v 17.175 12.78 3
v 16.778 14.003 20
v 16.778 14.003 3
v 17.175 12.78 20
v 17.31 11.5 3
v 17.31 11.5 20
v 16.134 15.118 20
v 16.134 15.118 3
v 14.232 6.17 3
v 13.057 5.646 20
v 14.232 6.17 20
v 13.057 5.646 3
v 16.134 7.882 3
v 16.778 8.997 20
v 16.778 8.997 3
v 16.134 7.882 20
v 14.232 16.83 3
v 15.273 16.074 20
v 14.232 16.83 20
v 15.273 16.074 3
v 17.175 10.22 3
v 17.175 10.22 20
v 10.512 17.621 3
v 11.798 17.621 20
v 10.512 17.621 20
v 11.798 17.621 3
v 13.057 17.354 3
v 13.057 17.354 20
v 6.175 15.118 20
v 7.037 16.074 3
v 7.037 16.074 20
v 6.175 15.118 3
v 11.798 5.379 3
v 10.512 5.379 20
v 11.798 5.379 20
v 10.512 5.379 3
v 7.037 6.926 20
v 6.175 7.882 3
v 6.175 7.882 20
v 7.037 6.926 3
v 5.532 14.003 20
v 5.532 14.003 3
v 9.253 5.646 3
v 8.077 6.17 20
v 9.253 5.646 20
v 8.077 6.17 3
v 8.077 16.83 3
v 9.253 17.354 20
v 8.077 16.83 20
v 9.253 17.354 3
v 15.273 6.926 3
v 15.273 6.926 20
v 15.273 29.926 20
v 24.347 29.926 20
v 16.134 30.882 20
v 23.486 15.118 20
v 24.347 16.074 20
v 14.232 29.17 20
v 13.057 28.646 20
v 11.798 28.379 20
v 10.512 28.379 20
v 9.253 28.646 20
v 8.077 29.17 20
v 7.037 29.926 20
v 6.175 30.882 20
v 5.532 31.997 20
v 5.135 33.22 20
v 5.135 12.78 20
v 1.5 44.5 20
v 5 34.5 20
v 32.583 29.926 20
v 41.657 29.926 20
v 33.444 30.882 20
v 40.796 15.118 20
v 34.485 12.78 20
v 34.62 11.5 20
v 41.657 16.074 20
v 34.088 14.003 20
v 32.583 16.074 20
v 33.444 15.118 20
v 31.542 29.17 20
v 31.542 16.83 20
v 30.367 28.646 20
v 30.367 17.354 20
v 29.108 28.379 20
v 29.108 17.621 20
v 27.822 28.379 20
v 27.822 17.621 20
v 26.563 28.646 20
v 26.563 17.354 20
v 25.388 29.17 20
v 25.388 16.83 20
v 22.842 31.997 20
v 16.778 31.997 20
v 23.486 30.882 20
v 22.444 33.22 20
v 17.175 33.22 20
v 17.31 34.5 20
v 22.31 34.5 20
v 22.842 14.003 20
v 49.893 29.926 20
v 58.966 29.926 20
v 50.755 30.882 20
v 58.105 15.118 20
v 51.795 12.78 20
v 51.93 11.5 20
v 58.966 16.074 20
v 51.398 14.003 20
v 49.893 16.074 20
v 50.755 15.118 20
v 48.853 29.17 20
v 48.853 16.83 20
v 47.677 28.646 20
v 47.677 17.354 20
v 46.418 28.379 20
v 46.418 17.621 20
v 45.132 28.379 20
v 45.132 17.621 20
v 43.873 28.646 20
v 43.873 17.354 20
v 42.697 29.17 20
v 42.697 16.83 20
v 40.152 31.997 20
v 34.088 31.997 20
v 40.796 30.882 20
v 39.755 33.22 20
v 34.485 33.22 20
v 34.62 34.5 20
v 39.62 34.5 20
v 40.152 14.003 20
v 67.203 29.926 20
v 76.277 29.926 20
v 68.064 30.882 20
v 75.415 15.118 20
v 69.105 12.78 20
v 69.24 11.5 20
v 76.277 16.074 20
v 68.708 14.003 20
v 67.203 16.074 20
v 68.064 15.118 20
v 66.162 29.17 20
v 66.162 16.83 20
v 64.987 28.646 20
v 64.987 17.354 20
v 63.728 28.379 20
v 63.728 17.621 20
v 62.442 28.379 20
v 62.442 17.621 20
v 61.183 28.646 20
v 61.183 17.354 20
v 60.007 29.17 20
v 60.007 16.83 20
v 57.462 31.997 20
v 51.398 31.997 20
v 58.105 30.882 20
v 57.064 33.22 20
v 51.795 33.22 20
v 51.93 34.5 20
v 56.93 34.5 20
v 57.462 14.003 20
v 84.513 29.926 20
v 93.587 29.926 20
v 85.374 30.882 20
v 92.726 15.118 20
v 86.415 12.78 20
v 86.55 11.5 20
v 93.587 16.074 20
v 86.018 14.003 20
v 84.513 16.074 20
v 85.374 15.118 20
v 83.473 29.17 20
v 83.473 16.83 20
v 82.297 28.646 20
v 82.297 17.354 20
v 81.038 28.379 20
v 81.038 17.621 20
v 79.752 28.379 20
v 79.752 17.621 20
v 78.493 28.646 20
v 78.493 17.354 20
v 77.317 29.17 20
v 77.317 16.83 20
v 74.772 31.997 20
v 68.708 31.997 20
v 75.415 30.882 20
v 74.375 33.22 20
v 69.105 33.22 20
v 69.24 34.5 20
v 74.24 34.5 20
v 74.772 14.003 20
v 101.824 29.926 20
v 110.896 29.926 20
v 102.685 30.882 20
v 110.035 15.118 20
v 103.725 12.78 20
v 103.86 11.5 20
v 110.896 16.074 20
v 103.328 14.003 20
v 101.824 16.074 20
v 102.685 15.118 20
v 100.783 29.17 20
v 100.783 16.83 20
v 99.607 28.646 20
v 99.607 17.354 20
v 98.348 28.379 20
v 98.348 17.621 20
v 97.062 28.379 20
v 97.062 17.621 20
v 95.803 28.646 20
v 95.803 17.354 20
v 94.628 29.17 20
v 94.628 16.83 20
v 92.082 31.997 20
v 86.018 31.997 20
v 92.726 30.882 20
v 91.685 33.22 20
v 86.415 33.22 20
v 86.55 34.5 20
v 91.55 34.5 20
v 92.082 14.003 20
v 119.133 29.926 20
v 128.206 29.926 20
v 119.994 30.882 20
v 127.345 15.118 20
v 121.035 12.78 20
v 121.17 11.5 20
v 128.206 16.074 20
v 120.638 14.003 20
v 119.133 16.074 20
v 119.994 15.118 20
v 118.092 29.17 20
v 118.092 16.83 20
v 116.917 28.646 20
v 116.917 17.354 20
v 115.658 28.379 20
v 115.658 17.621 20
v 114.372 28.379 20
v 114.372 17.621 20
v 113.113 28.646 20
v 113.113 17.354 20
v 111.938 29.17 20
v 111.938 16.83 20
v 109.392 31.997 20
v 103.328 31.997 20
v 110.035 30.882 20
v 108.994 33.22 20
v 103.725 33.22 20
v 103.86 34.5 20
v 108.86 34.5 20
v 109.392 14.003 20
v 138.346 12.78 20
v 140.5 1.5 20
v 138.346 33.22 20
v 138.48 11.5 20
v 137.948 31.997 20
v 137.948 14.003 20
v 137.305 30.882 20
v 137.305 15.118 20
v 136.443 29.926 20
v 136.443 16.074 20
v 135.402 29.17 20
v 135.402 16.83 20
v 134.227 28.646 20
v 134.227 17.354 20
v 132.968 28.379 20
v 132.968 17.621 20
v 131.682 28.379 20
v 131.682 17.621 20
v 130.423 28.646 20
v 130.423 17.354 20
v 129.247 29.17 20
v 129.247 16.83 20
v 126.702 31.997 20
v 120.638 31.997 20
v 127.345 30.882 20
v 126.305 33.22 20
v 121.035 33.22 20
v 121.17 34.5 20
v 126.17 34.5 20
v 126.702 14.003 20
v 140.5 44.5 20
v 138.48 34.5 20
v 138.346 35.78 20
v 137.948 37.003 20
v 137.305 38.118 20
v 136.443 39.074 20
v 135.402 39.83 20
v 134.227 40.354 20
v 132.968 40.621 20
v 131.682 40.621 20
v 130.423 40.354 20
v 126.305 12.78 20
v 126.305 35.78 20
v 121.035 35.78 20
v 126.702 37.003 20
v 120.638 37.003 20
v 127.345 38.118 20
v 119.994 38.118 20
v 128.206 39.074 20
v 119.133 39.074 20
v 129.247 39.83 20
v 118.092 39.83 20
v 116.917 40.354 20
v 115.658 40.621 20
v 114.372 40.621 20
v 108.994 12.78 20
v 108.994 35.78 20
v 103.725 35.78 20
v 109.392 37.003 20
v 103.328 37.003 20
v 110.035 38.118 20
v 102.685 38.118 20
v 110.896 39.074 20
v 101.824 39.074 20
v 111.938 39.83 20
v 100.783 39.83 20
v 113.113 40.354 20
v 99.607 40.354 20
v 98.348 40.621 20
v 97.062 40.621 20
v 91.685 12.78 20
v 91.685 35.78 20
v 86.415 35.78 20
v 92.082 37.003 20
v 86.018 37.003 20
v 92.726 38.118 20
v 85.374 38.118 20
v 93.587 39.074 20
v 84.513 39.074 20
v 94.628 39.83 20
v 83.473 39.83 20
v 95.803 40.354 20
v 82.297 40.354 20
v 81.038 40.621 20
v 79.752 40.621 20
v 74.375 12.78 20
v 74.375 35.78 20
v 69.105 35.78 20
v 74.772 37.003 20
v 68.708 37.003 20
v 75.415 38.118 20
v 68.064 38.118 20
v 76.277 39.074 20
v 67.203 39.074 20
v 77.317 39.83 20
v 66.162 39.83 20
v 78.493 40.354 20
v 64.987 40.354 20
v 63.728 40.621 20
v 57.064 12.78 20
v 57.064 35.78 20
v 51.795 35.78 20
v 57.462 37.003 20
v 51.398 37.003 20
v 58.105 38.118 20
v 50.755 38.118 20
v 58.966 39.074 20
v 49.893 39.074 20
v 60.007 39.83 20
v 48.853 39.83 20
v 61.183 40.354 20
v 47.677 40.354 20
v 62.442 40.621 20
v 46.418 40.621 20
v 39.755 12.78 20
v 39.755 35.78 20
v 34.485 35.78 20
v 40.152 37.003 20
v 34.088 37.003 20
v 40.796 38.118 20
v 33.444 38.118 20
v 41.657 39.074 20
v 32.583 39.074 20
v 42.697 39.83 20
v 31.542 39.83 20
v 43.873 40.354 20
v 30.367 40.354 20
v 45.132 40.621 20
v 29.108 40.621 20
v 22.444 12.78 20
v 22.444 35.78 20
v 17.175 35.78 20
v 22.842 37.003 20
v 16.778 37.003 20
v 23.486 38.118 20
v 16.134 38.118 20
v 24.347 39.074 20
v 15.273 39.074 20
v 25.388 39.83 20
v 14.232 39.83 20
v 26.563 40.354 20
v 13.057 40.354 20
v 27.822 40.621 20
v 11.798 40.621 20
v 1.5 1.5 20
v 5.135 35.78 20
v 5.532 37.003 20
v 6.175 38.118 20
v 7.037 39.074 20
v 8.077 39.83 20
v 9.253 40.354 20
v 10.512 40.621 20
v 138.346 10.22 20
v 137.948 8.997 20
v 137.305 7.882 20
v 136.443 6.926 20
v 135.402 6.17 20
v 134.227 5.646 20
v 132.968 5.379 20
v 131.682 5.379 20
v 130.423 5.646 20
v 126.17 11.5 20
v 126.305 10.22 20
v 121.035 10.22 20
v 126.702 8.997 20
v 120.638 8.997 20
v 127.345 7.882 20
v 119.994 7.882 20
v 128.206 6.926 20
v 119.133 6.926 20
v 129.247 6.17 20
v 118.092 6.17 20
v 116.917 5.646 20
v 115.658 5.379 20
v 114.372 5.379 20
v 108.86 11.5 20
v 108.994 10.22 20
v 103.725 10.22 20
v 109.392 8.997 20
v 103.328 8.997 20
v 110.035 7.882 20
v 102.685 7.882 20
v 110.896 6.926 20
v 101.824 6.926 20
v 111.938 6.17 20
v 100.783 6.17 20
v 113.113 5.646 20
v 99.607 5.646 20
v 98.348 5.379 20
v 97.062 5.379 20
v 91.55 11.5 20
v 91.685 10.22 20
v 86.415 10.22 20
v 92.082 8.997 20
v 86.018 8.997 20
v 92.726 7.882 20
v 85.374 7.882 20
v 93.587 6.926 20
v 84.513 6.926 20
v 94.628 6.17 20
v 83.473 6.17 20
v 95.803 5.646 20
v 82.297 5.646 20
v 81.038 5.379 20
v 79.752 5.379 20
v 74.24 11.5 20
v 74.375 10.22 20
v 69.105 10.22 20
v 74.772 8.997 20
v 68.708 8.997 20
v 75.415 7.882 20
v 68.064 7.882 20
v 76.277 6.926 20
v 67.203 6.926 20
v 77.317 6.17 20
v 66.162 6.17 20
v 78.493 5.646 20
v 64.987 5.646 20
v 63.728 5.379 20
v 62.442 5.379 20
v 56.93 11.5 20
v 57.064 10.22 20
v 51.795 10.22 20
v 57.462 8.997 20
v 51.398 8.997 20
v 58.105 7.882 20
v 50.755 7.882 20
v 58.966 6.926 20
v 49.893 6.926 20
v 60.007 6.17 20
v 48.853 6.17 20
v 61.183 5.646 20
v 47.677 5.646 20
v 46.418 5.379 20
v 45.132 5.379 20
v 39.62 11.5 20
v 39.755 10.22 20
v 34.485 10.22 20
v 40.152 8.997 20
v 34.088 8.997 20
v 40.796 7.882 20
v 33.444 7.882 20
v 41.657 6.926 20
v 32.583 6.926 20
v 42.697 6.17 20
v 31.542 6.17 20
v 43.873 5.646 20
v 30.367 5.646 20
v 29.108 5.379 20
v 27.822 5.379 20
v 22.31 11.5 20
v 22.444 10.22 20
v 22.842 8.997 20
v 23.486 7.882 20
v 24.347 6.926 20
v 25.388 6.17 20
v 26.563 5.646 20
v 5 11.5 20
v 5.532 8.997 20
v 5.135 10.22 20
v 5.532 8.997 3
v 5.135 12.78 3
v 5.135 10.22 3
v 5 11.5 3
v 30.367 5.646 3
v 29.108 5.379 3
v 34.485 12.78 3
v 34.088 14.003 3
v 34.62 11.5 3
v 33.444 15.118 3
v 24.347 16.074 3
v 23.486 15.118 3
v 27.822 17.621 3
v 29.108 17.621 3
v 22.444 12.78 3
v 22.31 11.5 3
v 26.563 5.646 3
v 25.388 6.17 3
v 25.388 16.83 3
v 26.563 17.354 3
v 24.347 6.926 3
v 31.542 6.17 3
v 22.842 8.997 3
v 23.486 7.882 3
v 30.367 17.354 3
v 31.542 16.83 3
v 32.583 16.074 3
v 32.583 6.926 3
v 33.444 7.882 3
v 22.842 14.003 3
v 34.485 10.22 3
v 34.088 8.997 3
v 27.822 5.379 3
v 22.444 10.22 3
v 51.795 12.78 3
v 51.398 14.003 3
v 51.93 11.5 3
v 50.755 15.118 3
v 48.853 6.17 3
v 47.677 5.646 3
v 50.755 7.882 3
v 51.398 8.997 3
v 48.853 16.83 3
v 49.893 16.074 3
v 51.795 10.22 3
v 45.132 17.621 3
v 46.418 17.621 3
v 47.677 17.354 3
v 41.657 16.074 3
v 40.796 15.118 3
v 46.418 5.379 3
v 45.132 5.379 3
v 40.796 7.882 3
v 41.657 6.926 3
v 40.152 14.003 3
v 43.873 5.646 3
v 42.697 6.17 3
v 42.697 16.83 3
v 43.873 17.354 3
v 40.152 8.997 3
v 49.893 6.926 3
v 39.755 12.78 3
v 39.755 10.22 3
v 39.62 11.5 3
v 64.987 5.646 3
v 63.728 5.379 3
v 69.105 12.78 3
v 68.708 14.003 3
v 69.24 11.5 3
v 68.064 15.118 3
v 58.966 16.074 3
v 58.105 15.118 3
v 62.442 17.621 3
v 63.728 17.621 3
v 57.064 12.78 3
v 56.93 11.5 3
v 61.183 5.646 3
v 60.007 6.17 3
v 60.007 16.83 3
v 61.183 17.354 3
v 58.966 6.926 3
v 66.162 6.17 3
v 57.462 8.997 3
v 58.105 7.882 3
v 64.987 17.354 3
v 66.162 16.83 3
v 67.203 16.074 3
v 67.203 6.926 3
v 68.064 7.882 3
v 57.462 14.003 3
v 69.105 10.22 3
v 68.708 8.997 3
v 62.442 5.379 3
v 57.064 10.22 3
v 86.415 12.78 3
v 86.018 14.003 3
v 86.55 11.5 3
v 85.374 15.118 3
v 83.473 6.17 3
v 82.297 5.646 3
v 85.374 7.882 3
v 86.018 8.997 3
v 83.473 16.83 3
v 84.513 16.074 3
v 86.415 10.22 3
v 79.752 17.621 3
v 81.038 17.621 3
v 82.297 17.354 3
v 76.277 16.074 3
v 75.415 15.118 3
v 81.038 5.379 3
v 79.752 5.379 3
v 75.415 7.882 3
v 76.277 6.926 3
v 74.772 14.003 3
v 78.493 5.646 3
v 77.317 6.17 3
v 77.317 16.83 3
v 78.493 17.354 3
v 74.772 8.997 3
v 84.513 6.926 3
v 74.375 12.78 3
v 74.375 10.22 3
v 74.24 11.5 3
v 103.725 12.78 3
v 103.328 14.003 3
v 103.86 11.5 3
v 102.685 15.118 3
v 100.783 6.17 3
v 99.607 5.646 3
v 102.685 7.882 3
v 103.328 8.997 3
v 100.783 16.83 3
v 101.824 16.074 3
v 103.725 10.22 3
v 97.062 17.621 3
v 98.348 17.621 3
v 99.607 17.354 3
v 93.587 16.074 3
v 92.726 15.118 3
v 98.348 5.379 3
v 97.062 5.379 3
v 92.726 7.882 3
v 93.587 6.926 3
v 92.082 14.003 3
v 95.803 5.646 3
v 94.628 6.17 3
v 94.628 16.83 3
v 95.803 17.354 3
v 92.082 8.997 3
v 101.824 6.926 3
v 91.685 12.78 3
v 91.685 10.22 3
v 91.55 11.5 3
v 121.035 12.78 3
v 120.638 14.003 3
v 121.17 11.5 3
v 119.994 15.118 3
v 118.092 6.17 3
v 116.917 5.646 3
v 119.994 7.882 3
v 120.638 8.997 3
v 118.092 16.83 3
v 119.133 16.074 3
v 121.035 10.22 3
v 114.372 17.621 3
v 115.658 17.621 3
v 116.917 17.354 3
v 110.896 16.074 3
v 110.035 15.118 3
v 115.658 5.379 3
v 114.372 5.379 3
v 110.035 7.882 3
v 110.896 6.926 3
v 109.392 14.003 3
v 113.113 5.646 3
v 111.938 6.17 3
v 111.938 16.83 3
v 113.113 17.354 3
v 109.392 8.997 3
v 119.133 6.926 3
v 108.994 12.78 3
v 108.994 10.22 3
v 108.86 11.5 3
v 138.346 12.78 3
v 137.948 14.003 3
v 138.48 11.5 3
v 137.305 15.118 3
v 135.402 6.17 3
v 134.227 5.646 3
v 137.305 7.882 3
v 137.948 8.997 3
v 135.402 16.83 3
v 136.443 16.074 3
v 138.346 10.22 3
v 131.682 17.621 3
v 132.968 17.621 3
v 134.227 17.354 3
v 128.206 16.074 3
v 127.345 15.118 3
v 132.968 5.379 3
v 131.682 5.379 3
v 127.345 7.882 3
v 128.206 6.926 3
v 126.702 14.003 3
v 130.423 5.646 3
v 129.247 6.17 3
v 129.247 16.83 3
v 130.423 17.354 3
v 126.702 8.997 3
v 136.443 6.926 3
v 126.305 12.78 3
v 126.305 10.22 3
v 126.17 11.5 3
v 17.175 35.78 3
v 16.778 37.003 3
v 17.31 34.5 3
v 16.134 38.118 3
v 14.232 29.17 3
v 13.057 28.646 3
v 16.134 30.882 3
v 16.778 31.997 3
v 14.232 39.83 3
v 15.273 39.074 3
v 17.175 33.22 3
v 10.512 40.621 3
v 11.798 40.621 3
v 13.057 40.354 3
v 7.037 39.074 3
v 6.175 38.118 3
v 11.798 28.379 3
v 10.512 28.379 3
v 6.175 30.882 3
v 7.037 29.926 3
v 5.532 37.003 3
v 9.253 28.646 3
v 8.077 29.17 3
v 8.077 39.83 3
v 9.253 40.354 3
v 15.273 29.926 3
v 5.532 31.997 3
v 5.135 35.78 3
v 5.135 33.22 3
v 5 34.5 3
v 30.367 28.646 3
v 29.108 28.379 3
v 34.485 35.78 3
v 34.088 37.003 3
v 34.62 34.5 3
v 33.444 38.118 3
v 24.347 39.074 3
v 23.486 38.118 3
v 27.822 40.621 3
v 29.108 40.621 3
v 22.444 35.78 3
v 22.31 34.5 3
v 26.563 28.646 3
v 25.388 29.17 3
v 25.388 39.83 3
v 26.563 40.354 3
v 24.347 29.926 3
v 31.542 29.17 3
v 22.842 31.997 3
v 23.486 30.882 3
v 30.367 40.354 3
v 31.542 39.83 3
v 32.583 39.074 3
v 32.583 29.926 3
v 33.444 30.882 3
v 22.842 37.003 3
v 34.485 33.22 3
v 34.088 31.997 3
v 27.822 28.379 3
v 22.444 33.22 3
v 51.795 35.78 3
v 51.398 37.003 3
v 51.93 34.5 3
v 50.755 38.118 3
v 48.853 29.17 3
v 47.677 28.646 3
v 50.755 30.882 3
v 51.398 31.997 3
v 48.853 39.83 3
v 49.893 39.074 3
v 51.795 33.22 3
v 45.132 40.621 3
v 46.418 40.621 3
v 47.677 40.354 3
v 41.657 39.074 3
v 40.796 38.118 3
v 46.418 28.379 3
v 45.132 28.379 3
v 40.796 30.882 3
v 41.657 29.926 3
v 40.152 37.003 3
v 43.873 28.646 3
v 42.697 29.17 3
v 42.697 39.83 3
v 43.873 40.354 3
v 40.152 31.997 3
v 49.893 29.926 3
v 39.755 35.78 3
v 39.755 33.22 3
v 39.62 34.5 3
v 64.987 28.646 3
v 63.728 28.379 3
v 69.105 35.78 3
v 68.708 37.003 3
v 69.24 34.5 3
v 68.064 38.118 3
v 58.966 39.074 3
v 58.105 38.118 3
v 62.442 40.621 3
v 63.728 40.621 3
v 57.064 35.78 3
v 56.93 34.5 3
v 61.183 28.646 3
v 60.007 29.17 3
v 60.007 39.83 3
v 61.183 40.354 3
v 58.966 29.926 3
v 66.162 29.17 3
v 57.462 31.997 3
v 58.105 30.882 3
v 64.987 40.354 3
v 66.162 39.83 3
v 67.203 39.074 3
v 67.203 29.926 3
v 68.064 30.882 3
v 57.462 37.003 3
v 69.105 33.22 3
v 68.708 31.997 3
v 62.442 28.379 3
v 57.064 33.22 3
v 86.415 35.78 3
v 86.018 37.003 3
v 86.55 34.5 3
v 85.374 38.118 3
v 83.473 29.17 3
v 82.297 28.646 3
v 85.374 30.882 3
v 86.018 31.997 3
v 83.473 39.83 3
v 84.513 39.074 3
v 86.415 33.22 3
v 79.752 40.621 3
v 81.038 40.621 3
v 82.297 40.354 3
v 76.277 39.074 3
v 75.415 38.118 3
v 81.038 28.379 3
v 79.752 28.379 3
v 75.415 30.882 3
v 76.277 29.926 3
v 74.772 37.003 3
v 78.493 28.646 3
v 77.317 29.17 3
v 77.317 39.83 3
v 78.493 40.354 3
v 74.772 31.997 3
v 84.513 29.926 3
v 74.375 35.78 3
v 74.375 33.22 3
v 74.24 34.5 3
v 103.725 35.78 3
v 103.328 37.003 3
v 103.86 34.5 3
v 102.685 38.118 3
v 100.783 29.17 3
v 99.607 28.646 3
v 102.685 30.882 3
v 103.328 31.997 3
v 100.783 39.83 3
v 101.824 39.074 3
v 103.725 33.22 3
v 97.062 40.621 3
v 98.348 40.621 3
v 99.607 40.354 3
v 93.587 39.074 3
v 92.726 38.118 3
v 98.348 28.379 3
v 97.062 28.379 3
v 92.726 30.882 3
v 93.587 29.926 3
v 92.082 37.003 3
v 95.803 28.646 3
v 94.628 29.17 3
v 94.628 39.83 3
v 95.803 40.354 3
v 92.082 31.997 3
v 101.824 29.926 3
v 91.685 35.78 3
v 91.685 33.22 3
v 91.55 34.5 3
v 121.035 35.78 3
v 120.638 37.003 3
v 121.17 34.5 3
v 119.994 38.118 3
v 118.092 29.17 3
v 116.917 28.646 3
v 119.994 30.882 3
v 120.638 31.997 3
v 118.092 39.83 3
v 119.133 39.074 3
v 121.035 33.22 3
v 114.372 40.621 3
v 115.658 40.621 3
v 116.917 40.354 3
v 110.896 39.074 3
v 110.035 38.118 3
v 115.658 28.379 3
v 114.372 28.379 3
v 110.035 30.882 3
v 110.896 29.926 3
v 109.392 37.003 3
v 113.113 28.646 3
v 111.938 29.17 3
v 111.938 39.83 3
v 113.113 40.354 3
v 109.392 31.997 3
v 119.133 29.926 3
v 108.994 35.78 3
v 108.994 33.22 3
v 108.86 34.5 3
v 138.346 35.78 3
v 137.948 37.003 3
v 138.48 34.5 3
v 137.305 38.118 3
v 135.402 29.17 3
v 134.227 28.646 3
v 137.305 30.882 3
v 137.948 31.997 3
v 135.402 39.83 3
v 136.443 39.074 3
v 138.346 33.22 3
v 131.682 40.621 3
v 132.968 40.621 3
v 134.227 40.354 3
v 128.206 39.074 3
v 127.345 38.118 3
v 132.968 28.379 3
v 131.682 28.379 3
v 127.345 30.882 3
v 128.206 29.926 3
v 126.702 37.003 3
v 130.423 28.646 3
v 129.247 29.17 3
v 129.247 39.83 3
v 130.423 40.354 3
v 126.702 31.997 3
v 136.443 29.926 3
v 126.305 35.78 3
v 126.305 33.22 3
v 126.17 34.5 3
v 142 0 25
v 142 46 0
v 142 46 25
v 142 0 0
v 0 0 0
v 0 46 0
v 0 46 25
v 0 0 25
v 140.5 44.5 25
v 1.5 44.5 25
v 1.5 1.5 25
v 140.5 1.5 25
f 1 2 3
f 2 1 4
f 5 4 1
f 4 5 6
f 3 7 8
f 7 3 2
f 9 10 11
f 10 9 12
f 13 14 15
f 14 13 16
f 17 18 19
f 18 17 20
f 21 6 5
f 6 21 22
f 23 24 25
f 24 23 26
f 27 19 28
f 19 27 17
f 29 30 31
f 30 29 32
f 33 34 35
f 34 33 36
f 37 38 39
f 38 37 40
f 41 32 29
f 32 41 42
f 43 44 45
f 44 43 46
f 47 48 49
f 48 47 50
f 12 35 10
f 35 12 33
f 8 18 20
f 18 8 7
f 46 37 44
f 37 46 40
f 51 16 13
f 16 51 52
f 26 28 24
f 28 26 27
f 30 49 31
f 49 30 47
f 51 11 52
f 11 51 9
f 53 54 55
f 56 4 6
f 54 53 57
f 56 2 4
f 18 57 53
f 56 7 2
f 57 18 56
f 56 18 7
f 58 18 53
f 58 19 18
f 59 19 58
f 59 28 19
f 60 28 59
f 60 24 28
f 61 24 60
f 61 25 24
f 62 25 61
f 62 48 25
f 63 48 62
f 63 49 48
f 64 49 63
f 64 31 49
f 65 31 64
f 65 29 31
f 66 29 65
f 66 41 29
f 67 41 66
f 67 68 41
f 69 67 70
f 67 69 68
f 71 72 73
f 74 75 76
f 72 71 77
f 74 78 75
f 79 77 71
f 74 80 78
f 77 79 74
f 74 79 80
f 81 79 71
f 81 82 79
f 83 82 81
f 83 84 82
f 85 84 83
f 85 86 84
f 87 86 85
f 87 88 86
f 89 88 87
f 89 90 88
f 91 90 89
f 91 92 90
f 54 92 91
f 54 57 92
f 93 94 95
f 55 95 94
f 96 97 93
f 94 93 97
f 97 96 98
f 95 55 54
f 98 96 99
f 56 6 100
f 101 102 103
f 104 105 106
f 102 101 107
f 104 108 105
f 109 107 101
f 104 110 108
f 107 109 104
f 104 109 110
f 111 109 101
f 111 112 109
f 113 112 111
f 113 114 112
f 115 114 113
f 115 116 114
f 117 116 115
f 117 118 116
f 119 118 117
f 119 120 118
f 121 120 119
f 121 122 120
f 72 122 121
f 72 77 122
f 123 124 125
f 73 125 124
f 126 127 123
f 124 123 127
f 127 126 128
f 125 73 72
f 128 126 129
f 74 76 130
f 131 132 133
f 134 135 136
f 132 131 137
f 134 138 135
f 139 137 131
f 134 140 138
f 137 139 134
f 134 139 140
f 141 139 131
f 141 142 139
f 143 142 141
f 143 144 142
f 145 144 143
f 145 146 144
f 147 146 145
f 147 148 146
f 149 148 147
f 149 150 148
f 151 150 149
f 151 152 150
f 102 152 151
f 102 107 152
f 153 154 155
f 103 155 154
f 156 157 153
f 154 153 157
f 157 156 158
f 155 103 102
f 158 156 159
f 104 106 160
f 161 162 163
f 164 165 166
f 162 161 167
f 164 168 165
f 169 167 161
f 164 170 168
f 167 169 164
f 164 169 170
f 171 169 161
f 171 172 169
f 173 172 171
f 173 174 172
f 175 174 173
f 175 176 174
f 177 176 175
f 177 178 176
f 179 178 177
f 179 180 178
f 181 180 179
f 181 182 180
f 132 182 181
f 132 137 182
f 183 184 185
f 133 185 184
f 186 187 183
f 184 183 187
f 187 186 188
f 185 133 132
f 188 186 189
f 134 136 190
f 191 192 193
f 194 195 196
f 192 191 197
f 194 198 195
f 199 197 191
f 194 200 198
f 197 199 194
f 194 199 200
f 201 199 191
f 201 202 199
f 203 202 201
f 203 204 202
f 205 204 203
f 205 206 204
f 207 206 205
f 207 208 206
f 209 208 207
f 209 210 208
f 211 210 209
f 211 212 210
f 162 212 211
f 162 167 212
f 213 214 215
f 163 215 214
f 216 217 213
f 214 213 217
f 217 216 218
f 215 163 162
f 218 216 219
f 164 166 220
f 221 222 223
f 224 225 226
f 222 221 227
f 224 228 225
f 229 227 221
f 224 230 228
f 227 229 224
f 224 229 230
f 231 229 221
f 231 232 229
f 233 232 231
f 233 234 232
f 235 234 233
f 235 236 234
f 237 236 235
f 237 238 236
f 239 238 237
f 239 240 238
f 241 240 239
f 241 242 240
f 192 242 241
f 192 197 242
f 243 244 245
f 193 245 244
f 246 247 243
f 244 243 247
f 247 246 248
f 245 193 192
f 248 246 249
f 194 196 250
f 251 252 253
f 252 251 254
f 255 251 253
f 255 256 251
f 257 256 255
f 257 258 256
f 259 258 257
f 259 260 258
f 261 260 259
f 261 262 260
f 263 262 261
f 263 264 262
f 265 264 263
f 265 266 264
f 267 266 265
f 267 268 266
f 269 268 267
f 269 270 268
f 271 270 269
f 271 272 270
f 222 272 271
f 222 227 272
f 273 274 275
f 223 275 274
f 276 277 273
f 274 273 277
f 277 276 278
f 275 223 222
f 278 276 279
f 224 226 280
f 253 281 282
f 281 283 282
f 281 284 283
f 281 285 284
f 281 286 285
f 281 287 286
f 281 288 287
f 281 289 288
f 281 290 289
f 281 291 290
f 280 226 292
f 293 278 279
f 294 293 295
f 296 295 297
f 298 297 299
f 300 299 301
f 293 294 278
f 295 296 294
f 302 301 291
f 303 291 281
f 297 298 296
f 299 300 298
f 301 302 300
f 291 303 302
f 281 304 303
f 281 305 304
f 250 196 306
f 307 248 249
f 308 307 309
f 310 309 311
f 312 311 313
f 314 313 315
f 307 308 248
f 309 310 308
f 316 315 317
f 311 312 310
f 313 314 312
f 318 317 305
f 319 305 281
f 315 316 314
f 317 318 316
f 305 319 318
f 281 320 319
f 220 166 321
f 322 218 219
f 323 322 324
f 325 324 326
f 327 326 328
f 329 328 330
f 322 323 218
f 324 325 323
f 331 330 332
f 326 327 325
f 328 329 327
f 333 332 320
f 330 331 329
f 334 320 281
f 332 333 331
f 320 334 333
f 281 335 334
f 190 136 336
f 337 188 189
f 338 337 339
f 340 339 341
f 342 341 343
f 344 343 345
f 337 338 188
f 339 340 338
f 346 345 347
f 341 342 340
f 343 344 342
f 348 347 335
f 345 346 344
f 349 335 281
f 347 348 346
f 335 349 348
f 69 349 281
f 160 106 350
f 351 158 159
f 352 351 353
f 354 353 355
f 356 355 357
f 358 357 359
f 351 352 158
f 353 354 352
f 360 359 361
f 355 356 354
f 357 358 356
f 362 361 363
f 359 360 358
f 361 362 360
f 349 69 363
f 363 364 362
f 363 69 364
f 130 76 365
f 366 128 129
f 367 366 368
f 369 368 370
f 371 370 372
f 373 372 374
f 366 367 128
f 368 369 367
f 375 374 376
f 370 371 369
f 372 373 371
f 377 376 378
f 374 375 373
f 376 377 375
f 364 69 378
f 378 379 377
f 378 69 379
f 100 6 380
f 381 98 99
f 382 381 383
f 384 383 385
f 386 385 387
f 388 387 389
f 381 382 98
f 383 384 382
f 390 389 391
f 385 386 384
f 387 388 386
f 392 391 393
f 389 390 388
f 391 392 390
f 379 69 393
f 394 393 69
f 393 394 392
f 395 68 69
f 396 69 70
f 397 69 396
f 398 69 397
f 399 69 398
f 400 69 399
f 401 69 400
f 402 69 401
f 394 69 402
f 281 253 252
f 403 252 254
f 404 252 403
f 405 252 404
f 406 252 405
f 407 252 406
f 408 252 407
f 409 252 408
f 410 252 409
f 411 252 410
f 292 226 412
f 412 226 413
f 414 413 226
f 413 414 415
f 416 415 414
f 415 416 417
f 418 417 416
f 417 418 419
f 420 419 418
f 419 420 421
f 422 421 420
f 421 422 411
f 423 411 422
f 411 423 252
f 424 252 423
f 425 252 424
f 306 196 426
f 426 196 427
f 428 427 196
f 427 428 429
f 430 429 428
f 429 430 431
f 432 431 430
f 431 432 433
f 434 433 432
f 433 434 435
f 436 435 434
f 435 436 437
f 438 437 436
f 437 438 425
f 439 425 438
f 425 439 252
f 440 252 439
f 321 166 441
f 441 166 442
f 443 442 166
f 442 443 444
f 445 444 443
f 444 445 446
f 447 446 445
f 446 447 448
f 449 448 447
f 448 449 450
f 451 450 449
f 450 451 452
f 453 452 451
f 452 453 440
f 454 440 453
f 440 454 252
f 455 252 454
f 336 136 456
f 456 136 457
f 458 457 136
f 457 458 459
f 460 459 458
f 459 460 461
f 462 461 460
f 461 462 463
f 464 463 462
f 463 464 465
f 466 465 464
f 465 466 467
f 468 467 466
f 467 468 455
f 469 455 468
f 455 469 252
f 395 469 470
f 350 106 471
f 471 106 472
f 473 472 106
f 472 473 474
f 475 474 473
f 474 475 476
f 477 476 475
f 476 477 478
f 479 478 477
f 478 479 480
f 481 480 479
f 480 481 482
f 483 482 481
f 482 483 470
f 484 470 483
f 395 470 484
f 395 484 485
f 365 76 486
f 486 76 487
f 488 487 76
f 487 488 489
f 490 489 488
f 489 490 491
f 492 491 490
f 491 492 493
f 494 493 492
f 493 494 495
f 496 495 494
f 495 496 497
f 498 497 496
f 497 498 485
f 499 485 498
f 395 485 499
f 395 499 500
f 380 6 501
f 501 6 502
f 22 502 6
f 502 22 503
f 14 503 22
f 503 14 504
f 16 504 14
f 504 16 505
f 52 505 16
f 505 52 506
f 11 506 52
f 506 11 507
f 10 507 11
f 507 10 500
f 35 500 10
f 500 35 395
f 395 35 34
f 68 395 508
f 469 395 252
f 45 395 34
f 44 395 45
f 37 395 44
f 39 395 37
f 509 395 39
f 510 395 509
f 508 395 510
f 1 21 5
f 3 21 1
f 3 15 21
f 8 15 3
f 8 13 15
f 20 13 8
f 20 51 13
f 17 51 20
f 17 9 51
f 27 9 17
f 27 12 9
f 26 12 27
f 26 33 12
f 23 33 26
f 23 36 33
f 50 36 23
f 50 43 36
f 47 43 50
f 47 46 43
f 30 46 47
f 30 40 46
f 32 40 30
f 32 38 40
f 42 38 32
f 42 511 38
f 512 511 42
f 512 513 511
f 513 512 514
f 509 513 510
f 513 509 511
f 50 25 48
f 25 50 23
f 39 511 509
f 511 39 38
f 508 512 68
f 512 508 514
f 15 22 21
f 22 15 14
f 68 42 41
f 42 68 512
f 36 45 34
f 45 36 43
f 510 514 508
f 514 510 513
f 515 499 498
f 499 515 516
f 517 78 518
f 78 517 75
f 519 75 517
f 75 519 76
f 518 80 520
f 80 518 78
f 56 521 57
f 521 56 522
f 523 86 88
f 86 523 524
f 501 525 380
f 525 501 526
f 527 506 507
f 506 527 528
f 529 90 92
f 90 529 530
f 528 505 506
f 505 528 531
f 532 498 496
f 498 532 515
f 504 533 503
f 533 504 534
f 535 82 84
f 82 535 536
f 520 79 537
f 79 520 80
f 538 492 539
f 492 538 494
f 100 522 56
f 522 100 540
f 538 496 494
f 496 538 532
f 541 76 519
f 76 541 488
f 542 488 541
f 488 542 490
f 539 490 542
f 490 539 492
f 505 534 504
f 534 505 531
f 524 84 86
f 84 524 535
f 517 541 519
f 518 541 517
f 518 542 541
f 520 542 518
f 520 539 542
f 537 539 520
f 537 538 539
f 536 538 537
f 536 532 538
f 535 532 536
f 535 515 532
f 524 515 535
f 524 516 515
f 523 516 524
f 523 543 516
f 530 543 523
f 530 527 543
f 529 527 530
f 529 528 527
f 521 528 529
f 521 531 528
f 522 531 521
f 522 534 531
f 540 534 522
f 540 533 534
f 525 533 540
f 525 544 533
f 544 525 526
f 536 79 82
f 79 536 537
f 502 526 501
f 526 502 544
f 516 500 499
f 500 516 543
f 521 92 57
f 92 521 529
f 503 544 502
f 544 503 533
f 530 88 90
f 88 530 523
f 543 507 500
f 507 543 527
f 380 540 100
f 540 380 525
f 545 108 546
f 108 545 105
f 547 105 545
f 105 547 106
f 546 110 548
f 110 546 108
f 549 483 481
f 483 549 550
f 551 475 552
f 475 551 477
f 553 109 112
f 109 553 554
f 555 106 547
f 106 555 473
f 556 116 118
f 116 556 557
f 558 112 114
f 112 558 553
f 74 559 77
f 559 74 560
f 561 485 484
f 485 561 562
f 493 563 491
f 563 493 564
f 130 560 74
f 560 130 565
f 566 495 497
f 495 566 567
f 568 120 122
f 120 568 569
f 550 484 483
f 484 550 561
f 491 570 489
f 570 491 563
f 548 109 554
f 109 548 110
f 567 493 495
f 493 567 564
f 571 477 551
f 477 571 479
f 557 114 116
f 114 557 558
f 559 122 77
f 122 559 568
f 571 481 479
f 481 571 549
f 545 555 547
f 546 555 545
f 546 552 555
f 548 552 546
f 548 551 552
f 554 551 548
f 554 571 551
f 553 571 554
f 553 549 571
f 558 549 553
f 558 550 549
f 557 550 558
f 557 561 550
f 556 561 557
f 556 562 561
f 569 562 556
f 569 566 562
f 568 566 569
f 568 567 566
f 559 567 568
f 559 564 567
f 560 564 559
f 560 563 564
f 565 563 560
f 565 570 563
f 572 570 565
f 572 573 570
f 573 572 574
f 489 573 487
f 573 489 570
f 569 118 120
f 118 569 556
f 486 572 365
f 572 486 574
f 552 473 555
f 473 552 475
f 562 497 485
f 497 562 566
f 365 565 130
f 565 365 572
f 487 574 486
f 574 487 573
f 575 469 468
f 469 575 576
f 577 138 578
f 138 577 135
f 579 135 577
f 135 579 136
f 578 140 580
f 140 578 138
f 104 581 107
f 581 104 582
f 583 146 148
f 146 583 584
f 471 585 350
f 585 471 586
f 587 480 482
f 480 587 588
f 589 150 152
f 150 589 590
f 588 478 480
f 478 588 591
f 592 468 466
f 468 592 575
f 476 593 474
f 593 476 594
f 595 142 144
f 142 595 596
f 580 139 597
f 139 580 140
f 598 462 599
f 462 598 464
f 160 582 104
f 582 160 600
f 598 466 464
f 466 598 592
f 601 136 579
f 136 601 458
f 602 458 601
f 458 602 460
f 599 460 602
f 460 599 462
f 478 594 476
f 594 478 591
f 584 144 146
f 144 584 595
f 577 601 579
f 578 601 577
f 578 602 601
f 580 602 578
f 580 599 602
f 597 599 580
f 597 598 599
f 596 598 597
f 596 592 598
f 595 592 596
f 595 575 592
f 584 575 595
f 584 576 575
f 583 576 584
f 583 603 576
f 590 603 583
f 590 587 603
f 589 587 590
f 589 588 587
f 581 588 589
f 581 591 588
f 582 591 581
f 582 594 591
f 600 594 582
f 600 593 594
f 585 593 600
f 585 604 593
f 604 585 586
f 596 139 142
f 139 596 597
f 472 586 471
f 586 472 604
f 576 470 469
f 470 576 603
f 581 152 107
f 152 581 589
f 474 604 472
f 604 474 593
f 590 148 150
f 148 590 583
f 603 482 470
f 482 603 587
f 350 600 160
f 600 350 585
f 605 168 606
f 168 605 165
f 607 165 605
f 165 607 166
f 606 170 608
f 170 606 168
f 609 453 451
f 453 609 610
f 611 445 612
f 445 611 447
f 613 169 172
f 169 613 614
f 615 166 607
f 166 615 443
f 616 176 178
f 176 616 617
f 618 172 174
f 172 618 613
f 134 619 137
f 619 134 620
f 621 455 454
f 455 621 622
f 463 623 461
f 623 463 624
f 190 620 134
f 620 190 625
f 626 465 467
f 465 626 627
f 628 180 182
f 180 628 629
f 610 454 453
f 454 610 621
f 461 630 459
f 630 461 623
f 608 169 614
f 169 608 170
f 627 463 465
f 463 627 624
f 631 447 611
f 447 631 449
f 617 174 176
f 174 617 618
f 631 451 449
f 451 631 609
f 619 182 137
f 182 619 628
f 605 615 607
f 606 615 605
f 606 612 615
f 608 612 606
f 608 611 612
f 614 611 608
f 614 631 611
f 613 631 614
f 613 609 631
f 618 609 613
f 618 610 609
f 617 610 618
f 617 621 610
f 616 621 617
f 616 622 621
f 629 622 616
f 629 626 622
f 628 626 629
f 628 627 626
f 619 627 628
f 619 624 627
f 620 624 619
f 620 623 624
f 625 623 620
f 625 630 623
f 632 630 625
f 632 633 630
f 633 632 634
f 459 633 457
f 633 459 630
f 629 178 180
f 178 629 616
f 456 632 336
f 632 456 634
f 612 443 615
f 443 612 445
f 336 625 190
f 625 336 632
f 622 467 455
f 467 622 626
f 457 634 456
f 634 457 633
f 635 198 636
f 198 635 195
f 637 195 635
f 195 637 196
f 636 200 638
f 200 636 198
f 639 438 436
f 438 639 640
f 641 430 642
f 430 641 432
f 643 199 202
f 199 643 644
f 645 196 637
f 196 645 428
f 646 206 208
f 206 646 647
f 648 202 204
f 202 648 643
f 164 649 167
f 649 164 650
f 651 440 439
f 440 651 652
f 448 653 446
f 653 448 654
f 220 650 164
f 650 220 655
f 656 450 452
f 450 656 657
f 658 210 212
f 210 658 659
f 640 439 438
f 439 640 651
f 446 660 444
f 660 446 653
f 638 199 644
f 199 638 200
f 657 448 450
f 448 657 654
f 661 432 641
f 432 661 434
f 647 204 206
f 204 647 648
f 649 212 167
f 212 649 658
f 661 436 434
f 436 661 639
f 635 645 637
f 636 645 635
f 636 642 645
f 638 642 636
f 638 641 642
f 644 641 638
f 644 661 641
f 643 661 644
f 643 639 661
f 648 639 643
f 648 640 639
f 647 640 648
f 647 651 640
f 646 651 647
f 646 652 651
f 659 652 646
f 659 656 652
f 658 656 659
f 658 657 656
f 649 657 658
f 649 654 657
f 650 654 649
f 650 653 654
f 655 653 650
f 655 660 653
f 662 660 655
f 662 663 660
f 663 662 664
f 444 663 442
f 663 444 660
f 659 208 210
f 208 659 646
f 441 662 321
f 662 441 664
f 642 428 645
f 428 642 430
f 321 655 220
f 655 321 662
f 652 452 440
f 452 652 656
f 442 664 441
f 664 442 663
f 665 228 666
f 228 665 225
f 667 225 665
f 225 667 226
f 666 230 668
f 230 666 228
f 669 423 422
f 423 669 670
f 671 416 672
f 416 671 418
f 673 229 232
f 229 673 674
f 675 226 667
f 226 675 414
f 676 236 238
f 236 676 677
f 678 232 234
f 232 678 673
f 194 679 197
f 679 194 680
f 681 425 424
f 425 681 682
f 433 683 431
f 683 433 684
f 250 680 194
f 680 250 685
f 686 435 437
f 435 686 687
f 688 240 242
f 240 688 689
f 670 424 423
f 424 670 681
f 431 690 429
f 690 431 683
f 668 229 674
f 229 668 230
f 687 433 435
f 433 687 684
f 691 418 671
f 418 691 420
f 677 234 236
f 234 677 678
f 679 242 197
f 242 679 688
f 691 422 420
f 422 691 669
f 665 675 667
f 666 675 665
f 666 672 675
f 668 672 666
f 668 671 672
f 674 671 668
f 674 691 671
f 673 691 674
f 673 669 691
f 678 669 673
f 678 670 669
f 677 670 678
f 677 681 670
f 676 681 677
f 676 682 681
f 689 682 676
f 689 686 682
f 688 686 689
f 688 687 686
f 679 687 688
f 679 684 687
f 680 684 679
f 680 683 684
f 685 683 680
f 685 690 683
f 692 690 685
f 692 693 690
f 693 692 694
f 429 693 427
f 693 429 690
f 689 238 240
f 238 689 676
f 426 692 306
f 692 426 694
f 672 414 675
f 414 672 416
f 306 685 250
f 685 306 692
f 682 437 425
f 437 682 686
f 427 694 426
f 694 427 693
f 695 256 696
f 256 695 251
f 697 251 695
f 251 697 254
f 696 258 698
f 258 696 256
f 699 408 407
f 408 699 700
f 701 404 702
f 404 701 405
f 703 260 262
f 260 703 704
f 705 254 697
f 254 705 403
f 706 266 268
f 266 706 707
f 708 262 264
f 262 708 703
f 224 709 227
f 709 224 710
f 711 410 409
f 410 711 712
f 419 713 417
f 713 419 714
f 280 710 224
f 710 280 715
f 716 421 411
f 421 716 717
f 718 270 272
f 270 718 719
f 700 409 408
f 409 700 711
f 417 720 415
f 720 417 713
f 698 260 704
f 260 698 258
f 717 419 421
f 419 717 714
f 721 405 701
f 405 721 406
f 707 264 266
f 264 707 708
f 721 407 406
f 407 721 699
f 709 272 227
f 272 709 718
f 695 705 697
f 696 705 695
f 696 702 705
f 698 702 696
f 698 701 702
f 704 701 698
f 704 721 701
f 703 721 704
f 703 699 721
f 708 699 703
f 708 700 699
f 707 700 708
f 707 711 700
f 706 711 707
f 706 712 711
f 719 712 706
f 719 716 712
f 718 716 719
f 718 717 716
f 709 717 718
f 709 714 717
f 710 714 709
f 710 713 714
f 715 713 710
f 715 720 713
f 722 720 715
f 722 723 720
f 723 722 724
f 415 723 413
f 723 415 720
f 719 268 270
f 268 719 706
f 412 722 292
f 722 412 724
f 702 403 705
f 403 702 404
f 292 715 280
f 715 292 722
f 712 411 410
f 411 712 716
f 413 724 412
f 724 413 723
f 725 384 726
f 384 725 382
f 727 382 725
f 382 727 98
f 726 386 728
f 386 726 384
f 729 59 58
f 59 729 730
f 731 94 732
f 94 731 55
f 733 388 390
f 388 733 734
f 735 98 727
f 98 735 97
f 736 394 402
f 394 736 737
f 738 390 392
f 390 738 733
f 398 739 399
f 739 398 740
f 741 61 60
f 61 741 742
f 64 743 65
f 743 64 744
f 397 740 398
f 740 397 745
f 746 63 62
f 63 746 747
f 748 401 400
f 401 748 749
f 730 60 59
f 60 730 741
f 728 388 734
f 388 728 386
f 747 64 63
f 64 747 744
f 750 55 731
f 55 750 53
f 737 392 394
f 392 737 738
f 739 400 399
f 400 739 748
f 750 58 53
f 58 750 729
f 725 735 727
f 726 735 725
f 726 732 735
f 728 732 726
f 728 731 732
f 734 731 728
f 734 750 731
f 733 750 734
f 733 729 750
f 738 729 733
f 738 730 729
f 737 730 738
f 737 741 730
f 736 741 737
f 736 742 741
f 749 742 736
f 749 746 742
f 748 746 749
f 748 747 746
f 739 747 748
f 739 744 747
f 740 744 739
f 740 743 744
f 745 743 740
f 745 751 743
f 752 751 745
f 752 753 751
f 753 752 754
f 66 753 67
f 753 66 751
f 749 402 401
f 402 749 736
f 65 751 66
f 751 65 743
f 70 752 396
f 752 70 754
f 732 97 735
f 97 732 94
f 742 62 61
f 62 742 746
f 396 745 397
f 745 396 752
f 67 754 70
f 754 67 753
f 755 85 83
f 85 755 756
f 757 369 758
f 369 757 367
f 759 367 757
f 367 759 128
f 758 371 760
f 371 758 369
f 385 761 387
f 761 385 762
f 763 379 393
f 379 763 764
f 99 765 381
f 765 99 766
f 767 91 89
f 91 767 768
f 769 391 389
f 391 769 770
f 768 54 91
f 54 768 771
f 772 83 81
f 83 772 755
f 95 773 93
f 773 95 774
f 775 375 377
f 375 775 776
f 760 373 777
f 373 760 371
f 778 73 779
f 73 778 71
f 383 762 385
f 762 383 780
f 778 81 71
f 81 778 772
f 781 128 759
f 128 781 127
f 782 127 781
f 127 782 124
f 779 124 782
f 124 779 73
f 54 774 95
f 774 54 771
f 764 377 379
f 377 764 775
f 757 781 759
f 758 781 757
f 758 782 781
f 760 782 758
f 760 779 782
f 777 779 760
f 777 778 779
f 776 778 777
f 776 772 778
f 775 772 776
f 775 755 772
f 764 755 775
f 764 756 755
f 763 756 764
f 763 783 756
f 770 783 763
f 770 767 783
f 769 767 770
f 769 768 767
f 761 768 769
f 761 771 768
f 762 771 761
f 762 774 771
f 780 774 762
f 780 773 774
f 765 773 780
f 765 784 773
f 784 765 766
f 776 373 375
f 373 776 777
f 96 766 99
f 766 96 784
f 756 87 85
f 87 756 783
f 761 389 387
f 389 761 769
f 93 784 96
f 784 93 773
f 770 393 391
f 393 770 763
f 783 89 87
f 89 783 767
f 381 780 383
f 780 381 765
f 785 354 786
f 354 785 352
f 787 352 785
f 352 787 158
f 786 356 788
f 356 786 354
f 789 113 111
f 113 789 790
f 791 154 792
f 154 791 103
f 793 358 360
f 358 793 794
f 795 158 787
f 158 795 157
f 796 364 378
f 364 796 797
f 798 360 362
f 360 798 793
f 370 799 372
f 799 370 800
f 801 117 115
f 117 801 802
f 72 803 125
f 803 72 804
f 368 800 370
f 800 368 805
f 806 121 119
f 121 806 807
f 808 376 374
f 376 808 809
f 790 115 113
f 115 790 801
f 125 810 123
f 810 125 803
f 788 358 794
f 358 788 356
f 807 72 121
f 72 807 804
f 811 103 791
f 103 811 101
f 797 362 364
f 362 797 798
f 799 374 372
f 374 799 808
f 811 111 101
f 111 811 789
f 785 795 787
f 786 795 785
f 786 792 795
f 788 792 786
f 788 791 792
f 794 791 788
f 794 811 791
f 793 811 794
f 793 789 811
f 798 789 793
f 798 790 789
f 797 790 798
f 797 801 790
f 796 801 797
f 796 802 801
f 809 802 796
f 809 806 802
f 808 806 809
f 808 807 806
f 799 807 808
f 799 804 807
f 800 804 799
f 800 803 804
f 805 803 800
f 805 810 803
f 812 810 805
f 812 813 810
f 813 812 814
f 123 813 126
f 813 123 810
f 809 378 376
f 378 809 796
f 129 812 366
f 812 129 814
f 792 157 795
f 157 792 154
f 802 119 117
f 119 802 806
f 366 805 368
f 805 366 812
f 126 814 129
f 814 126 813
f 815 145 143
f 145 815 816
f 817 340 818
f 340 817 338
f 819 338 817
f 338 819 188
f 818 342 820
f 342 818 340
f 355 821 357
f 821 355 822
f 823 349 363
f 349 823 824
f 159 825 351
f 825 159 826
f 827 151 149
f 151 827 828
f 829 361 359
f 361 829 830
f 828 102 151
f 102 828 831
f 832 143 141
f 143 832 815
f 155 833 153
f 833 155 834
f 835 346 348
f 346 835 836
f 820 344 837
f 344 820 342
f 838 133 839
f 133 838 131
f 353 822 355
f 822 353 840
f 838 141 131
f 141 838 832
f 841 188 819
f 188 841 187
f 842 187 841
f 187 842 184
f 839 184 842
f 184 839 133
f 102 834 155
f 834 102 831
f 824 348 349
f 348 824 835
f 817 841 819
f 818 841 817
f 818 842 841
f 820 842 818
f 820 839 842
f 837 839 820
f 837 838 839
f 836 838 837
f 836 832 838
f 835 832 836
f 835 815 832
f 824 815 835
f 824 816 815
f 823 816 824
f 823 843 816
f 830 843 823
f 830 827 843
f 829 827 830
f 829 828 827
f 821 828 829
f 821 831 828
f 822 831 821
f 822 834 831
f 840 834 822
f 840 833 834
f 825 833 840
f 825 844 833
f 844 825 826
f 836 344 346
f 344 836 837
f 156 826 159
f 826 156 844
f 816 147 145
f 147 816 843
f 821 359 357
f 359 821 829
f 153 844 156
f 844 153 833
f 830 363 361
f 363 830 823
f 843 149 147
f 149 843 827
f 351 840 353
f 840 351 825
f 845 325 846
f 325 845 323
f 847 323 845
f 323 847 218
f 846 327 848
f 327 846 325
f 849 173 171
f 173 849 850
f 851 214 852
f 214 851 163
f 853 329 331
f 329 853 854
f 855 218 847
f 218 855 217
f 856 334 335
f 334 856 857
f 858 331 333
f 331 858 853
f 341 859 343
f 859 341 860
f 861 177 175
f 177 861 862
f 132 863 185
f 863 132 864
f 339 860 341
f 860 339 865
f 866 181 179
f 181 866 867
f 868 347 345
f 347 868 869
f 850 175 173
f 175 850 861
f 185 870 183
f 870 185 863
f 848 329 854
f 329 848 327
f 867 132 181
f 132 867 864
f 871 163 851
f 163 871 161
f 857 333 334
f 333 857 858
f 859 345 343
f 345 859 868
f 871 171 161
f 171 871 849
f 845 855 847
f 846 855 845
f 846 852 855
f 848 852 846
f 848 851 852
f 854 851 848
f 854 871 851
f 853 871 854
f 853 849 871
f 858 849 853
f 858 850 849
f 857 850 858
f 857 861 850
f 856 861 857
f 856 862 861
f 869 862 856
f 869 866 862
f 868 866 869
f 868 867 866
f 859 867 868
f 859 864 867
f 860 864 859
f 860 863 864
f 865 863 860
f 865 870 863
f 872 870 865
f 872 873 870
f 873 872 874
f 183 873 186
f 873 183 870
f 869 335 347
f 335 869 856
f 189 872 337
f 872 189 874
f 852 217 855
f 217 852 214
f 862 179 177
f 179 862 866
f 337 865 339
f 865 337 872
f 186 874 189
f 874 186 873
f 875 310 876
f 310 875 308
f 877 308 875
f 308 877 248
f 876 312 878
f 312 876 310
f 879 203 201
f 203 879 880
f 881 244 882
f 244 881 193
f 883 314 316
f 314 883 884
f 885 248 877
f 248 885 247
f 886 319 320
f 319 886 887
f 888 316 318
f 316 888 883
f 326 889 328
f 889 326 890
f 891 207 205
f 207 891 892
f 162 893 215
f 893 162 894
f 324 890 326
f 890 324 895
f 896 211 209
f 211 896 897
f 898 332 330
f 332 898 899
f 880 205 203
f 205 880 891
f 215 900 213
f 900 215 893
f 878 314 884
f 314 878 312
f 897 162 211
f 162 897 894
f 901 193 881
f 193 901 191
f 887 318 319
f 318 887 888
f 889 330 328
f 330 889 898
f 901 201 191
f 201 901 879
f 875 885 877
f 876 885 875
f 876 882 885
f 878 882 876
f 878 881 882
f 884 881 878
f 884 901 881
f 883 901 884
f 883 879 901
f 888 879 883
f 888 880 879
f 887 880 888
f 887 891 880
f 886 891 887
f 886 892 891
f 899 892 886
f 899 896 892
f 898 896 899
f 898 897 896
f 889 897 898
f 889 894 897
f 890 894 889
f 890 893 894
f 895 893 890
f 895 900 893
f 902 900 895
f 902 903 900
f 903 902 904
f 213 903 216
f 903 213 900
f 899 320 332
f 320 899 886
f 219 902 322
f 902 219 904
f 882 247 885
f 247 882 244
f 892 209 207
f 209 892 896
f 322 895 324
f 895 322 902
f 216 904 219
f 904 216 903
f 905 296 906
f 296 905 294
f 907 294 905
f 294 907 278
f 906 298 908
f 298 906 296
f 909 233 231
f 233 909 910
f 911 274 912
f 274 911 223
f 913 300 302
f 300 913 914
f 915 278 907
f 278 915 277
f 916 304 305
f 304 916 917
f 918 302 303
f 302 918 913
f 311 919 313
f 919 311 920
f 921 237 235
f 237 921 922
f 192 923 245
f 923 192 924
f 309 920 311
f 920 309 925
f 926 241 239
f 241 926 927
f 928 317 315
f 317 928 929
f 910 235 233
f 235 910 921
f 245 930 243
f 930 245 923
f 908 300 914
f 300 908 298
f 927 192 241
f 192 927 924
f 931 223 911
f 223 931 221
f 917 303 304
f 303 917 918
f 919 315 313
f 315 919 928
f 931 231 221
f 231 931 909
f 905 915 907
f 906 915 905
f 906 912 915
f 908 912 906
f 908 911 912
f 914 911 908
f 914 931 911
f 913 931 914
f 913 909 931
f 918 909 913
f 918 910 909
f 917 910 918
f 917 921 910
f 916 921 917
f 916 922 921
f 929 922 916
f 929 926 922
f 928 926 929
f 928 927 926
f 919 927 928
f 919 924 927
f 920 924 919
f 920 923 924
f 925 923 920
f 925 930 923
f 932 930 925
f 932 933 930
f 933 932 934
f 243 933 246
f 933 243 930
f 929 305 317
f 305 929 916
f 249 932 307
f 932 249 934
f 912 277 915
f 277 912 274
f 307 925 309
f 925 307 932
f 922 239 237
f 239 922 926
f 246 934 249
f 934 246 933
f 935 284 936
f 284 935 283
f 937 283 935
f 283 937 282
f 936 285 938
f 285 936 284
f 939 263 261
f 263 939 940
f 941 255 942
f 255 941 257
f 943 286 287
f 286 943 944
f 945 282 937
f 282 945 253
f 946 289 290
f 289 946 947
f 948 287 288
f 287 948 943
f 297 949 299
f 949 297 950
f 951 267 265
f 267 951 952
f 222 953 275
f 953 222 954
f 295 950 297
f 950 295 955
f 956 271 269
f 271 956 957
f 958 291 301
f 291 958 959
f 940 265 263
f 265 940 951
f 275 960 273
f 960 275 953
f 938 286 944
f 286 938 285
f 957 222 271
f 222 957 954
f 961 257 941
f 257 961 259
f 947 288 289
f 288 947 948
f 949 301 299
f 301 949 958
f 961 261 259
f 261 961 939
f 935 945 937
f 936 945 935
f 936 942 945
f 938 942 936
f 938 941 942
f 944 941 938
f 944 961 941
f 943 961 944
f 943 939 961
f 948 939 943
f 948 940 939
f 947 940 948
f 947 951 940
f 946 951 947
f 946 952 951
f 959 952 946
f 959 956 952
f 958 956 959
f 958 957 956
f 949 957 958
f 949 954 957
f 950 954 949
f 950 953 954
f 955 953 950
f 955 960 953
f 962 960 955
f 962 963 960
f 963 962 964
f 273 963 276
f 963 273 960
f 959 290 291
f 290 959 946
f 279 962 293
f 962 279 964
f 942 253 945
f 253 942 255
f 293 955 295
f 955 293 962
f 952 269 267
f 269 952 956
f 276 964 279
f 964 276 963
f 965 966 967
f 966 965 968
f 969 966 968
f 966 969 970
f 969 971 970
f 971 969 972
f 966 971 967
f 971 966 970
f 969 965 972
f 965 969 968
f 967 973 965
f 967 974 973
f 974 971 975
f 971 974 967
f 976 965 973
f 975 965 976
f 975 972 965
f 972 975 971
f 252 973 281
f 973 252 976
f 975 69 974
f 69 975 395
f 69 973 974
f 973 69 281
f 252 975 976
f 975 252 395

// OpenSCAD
// file: ../lib/BOSL2/std.scad
// Minimal BOSL2 compatibility shim for bundled gallery models.
// It implements only the helpers used by the imported OpenSCAD projects.

CENTER = [0, 0, 0];
BOTTOM = [0, 0, -1];
TOP = [0, 0, 1];
LEFT = [-1, 0, 0];
RIGHT = [1, 0, 0];
FRONT = [0, -1, 0];
BACK = [0, 1, 0];

module up(z=0) {
    translate([0, 0, z]) children();
}

module down(z=0) {
    translate([0, 0, -z]) children();
}

module attach(anchor=CENTER) {
    children();
}

module cuboid(size=[1, 1, 1], anchor=CENTER) {
    center = anchor == CENTER;
    translate(center ? [0, 0, 0] : [0, 0, size[2] / 2])
        cube(size, center=true);
    children();
}

module xcyl(h=1, r=1, anchor=CENTER) {
    center = anchor == CENTER;
    translate(center ? [0, 0, 0] : [h / 2, 0, 0])
        rotate([0, 90, 0])
            cylinder(h=h, r=r, center=true);
}
// main file
// allen socket case

include <../lib/BOSL2/std.scad>
// https://github.com/revarbat/BOSL2


// config
// ******************************************************
// socket dia 30/64 -> 15/32 11.9mm
n    = 8;           // number of sockets in a row
rows = 2;           // number of rows of sockets
d    = 12;          // diameter of hole for socket
tollerance = 0.31;  // wiggle room for error and platic shrink. 0.1 -> does not fit, 0.2 -> too tight, 0.3 -> nice fit

// holes
cyl_h = 17;                             // depth of hole
space_between = 5;                      // space between holes
cyl_offset_from_bottom = 3;             // bottom of hole to bottom of case
// config end
// ******************************************************

// mid-section dim
thickness  = 3;                         // thickness of mid-section and top wall
lip_height = 5;             

w = rows*(d + d/2) + 10; 
h = cyl_h + cyl_offset_from_bottom;     // height of bottom of case
l = n*space_between+n*d + d/2;          // length of case with n holes

$fn=30;

base( l=l, rows=rows, w=w, h=h, d=d+tollerance, space_between=space_between );
translate( [0,0,h] ) mid_section( t=thickness, l=l, w=w, h=lip_height );


module base( n=n, rows=1, l, w, h, d, space_between )
{
    eq_rows = w/rows;
    difference()
    {
        translate( [l/2,w/2,0]) cuboid([l,w,h], rounding=5, anchor=BOTTOM, edges=[BOTTOM+FRONT,BOTTOM+BACK,BOTTOM+RIGHT,BOTTOM+LEFT,FRONT+RIGHT, FRONT+LEFT, BACK+LEFT,BACK+RIGHT]);
        for( row = [1 : 1 : rows ] )
        {
            for( holes = [1 : 1 : n ] )
            {
                offset = (row-1)*eq_rows + eq_rows/2;
                translate( [holes*space_between + (holes-1)*d + d/2,  offset, cyl_offset_from_bottom] ) cylinder( d1=d, d2=d, h=cyl_h, center=false );
            }
        }
    }
}


module mid_section( t, l, w, h )
{
    difference()
    {
        translate( [l/2,w/2,0]) cuboid([l,w,h],     rounding=5, anchor=BOTTOM, edges=[LEFT+FRONT,LEFT+BACK,RIGHT+FRONT,RIGHT+BACK]);
        translate( [l/2,w/2,0]) cuboid([l-t,w-t,h], rounding=5, anchor=BOTTOM, edges=[LEFT+FRONT,LEFT+BACK,RIGHT+FRONT,RIGHT+BACK]);
    }
}
